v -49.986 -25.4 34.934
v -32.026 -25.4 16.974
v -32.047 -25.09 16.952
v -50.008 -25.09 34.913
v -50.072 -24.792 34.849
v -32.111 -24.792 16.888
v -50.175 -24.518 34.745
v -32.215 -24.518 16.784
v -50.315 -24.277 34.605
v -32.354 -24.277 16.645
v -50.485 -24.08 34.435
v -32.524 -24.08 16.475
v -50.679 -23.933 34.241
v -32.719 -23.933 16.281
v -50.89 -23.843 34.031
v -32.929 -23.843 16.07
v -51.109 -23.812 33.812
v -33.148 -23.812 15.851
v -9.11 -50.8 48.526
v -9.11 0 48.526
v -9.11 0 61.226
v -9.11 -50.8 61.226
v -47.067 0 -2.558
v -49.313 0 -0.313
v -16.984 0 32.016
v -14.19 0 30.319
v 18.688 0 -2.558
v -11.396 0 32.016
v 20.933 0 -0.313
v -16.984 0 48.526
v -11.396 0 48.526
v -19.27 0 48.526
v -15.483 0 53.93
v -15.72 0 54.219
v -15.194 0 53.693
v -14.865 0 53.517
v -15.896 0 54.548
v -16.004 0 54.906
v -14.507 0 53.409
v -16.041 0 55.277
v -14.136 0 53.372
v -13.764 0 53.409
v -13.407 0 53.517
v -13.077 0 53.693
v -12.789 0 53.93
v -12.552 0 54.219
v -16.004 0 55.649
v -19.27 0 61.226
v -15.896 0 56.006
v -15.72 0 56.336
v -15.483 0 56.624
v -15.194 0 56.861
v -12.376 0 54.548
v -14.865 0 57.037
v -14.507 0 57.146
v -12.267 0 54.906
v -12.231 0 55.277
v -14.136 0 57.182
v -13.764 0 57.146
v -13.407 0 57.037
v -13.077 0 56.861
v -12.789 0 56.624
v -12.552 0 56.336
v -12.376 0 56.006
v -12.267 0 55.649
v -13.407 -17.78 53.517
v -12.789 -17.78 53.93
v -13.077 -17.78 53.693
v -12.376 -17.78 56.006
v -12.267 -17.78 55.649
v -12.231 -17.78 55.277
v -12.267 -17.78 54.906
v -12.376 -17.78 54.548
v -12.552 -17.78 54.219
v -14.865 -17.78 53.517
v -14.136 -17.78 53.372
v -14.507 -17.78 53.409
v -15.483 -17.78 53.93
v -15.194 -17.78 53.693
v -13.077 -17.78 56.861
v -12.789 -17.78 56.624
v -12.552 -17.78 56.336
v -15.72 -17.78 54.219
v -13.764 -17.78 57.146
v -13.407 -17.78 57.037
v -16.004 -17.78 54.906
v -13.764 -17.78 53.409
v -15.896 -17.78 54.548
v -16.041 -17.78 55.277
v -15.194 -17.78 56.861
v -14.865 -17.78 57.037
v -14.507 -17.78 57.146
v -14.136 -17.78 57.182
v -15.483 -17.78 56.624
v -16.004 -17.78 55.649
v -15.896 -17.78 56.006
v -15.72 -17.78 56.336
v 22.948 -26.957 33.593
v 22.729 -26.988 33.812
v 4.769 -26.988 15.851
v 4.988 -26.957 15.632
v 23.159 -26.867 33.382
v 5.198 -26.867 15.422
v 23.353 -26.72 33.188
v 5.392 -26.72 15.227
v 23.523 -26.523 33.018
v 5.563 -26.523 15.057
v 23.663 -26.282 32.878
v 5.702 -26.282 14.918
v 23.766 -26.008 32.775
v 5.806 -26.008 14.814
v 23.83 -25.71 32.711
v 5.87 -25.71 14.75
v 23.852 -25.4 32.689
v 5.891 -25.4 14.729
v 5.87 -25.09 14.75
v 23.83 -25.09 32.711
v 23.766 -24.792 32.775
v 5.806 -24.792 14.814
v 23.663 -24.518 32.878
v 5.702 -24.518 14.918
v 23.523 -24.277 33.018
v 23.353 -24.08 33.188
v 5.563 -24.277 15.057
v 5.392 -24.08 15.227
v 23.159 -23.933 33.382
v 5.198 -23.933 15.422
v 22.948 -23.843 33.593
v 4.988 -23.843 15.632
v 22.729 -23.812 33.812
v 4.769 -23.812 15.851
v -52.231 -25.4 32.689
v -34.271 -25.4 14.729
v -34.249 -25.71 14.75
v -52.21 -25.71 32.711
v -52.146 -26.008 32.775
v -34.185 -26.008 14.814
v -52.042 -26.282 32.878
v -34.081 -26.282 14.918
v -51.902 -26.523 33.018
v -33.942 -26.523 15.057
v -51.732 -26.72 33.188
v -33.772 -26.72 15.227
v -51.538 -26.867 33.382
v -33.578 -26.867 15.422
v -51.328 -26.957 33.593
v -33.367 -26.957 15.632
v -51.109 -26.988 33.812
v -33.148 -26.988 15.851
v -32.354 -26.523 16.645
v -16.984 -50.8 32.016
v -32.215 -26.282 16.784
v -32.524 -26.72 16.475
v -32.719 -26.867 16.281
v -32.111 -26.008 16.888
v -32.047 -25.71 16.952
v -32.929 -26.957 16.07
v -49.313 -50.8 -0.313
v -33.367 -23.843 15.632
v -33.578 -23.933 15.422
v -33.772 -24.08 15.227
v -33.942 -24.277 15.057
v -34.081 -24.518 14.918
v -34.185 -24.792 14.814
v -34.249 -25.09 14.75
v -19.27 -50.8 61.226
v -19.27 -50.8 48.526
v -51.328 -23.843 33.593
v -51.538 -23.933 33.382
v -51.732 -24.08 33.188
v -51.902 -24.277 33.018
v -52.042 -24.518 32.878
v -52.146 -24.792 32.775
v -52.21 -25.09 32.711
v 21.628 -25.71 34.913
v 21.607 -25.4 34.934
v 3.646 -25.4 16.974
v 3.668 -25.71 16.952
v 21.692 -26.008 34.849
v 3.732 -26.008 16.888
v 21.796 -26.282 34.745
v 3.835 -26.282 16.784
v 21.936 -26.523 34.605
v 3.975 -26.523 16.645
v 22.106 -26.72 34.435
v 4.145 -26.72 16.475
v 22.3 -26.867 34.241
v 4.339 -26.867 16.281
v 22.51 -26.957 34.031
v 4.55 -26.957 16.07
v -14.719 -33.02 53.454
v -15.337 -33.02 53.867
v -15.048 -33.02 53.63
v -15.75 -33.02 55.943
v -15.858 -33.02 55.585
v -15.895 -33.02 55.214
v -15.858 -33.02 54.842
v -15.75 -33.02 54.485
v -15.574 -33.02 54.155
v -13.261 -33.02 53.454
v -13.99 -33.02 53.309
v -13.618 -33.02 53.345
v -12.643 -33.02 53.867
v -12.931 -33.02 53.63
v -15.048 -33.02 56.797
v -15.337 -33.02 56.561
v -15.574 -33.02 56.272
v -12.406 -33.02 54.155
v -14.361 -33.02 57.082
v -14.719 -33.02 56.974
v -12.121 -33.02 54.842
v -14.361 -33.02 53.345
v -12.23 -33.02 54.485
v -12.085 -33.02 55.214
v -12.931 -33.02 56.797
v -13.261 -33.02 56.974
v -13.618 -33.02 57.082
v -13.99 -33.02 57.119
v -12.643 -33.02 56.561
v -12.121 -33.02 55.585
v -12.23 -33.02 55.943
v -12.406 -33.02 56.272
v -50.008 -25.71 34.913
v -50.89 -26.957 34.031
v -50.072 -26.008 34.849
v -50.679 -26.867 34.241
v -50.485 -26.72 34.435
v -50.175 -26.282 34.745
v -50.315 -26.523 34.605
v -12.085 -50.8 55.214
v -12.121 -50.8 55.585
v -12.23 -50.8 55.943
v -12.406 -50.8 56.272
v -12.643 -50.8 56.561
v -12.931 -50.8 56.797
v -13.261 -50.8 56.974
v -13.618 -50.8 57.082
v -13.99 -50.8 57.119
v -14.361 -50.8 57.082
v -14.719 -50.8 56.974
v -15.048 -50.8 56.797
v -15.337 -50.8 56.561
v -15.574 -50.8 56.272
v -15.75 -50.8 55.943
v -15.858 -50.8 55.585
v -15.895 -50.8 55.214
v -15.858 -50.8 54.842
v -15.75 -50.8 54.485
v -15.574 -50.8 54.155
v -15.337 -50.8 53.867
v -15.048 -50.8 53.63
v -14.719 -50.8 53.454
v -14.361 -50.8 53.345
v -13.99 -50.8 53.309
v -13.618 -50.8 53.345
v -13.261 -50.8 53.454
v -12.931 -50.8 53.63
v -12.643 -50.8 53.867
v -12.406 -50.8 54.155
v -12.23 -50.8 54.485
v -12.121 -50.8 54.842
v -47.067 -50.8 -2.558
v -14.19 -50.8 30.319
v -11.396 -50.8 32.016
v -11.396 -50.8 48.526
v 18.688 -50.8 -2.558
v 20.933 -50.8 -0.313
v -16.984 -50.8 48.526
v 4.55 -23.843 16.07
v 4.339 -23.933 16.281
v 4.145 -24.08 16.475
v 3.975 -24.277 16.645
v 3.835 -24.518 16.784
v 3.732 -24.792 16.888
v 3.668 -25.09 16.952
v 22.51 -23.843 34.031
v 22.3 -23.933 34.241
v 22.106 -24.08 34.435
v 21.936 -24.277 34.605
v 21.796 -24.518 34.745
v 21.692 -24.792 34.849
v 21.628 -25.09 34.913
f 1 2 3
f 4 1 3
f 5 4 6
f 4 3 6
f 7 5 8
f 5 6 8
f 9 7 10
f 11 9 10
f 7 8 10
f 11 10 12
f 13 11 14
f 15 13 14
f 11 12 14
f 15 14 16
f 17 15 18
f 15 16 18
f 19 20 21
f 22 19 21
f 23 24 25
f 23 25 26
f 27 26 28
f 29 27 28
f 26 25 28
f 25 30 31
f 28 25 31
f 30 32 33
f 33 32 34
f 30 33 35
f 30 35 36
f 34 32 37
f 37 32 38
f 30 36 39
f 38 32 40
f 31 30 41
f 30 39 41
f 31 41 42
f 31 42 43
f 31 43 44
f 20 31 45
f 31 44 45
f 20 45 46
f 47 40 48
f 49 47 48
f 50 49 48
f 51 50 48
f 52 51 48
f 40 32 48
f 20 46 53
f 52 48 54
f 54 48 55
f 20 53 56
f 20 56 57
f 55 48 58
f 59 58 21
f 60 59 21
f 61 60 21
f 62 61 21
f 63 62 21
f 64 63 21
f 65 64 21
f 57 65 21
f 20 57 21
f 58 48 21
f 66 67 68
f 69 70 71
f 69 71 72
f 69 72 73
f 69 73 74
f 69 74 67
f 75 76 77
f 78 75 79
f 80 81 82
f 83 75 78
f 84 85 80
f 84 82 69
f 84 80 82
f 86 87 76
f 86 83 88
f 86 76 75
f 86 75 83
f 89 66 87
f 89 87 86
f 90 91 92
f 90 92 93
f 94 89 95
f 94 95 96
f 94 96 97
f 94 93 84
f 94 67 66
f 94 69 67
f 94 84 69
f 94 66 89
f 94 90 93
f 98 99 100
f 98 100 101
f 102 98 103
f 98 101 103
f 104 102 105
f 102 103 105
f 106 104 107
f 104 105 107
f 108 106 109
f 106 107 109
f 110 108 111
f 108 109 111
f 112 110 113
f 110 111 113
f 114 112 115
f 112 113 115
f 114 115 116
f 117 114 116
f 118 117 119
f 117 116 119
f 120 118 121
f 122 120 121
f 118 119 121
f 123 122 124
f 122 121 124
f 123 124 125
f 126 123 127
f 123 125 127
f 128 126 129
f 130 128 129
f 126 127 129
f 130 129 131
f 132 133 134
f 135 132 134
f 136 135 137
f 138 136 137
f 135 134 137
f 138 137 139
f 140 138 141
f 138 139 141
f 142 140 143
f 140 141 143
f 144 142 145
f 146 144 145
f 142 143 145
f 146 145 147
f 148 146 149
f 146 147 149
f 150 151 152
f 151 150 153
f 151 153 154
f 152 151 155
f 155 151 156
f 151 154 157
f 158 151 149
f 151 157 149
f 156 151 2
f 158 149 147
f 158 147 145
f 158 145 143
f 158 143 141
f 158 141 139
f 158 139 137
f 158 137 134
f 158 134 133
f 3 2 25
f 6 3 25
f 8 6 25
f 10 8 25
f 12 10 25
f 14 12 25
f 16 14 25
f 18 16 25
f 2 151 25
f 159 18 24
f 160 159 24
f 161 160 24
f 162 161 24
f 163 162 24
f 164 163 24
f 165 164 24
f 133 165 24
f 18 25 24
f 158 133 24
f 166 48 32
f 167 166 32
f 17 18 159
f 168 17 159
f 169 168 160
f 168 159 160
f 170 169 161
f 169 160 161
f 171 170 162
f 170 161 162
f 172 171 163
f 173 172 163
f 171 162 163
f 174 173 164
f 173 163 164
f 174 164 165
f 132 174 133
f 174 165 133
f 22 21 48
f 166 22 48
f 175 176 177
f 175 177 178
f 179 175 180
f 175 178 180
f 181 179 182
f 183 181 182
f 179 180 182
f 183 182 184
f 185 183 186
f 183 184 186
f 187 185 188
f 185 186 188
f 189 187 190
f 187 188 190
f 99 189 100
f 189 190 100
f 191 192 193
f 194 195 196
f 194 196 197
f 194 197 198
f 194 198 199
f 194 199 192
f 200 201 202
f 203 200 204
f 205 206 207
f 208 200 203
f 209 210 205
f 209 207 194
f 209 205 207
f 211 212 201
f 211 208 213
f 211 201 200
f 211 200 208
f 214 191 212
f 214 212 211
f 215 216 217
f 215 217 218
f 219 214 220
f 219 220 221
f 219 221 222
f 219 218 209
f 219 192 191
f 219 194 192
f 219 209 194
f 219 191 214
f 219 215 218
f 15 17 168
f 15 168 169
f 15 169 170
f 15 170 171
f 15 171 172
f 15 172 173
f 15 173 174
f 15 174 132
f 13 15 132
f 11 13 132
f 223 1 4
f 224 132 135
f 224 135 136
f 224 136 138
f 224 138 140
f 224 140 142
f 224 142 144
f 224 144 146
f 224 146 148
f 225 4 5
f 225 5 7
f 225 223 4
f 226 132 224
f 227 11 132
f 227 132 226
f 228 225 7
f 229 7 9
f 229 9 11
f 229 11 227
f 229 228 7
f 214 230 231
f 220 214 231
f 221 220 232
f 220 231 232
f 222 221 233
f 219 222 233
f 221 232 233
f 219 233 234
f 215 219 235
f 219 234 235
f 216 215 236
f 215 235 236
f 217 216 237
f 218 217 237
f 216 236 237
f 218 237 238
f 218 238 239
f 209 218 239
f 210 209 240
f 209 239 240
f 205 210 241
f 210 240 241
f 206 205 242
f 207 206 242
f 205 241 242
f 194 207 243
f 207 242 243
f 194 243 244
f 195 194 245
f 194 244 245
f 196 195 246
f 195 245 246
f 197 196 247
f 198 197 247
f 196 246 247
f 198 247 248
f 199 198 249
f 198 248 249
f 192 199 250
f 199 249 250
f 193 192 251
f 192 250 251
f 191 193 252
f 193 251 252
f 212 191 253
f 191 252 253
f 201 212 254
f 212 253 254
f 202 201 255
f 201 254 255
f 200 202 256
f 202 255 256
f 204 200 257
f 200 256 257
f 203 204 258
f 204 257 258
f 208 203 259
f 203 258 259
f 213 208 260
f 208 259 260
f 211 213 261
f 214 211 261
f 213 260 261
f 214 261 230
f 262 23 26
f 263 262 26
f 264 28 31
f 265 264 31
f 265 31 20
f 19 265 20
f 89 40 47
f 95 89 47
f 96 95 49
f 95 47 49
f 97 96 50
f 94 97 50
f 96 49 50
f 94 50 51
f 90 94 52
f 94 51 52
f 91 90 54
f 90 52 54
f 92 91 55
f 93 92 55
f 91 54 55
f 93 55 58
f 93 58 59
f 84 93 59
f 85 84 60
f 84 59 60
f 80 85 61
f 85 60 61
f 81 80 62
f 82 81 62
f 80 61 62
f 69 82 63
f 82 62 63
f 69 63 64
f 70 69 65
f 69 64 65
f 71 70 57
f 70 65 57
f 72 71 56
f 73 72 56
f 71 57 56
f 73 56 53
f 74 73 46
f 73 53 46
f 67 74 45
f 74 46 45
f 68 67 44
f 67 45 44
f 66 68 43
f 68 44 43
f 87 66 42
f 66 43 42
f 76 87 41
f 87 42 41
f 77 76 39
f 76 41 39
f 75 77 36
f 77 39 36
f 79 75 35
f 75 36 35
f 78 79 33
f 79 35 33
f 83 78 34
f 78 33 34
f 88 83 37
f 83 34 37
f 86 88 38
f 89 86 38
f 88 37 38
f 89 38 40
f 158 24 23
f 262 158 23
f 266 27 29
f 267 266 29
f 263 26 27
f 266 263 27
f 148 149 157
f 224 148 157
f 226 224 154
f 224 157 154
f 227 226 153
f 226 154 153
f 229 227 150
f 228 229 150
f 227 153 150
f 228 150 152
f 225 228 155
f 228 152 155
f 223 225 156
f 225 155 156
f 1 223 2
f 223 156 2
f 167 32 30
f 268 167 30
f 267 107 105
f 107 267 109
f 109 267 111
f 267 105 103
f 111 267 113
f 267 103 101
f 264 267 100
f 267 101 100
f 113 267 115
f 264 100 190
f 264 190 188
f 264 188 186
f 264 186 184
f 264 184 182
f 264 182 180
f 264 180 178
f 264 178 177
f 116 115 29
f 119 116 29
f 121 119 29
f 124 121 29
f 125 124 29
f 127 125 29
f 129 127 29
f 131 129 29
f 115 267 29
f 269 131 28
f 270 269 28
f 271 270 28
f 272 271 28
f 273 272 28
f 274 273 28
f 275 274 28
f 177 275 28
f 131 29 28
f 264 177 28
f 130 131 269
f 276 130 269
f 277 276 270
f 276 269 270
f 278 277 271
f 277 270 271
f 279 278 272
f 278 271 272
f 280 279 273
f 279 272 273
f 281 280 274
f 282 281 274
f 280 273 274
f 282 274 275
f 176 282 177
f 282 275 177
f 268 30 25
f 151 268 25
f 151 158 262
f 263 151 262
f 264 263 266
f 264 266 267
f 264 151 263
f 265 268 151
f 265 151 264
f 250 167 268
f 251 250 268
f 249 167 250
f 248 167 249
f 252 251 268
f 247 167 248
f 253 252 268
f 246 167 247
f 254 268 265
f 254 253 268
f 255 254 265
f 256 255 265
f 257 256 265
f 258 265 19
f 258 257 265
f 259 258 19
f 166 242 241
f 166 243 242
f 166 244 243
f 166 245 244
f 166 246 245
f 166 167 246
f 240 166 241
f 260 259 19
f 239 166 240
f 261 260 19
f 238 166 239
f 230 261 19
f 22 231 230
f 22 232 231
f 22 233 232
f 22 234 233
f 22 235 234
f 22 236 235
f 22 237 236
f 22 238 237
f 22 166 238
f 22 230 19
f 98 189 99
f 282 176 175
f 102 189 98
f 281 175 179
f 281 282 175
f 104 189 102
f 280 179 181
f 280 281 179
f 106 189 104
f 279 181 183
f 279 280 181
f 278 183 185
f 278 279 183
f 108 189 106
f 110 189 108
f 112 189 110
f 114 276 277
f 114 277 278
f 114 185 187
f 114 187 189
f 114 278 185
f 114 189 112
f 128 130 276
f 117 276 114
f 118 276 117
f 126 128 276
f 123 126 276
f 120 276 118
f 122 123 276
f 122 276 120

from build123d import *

# Parameters (mm, degrees)
F1_DEPTH = 50.8
F2_R     = 1.905
F3_DEPTH = 17.78
F6_DEPTH = 25.4
F8_DEPTH = 25.4
F4_R     = 1.905
F9_DEPTH = 17.78


with BuildPart() as f1:
    # F0 (on Front) → F1 (new body)
    with BuildSketch(Plane.XZ):
        Polygon((-9.1096315365, 61.225563957), (-19.2696315365, 61.225563957), (-19.2696315365, 48.525563957), (-16.9836315365, 48.525563957), (-16.9836315365, 32.015563957), (-14.1896315365, 32.015563957), (-11.3956315365, 32.015563957), (-11.3956315365, 48.525563957), (-9.1096315365, 48.525563957), align=None)
        Polygon((-14.1896315365, 32.015563957), (-16.9836315365, 32.015563957), (-49.3125535723, -0.3133580789), (-47.0674895421, -2.5584221091), (-14.1896315365, 30.3194358965), align=None)
        Polygon((-11.3956315365, 32.015563957), (-14.1896315365, 32.015563957), (-14.1896315365, 30.3194358965), (18.6882264691, -2.5584221091), (20.9332904994, -0.3133580789), align=None)
    extrude(amount=F1_DEPTH)

    # F2 (on face) → F3 (cut)
    with BuildSketch(Plane(origin=(0, 0, 0), x_dir=(-1, 0, 0), z_dir=(0, 1, 0))):
        with Locations((14.1358394176, 55.2771948278)):
            Circle(F2_R)
    extrude(amount=-F3_DEPTH, mode=Mode.SUBTRACT)

    # F5 (on face) → F6 (join)
    with BuildSketch(Plane(origin=(10.3099662102, 0, 10.3099662102), x_dir=(0.7071067812, 0, -0.7071067812), z_dir=(0.7071067812, 0, 0.7071067812))):
        with BuildLine():
            Line((-7.8363507129, -25.4), (-7.8363507129, -23.8125))
            ThreePointArc((-7.8363507129, -23.8125), (-8.958882728, -24.2774679849), (-9.4238507129, -25.4))
            Line((-9.4238507129, -25.4), (-7.8363507129, -25.4))
        make_face()
        with BuildLine():
            Line((-7.8363507129, -25.4), (-6.2488507129, -25.4))
            ThreePointArc((-6.2488507129, -25.4), (-6.7138186977, -24.2774679849), (-7.8363507129, -23.8125))
            Line((-7.8363507129, -23.8125), (-7.8363507129, -25.4))
        make_face()
        with BuildLine():
            ThreePointArc((-9.4238507129, -25.4), (-8.958882728, -26.5225320151), (-7.8363507129, -26.9875))
            Line((-7.8363507129, -26.9875), (-7.8363507129, -25.4))
            Line((-7.8363507129, -25.4), (-9.4238507129, -25.4))
        make_face()
        with BuildLine():
            ThreePointArc((-7.8363507129, -26.9875), (-6.7138186977, -26.5225320151), (-6.2488507129, -25.4))
            Line((-6.2488507129, -25.4), (-7.8363507129, -25.4))
            Line((-7.8363507129, -25.4), (-7.8363507129, -26.9875))
        make_face()
    extrude(amount=F6_DEPTH)

    # F7 (on face) → F8 (join)
    with BuildSketch(Plane(origin=(-24.4995977467, 0, 24.4995977467), x_dir=(0, -1, 0), z_dir=(-0.7071067812, 0, 0.7071067812))):
        with BuildLine():
            ThreePointArc((26.9875, -12.2308186511), (26.5225320151, -11.108286636), (25.4, -10.6433186511))
            Line((25.4, -10.6433186511), (25.4, -12.2308186511))
            Line((25.4, -12.2308186511), (26.9875, -12.2308186511))
        make_face()
        with BuildLine():
            Line((26.9875, -12.2308186511), (25.4, -12.2308186511))
            Line((25.4, -12.2308186511), (25.4, -13.8183186511))
            ThreePointArc((25.4, -13.8183186511), (26.5225320151, -13.3533506663), (26.9875, -12.2308186511))
        make_face()
        with BuildLine():
            Line((25.4, -12.2308186511), (23.8125, -12.2308186511))
            ThreePointArc((23.8125, -12.2308186511), (24.2774679849, -13.3533506663), (25.4, -13.8183186511))
            Line((25.4, -13.8183186511), (25.4, -12.2308186511))
        make_face()
        with BuildLine():
            Line((25.4, -12.2308186511), (25.4, -10.6433186511))
            ThreePointArc((25.4, -10.6433186511), (24.2774679849, -11.108286636), (23.8125, -12.2308186511))
            Line((23.8125, -12.2308186511), (25.4, -12.2308186511))
        make_face()
    extrude(amount=F8_DEPTH)

    # F4 (on face) → F9 (cut)
    with BuildSketch(Plane.XZ.offset(50.8)):
        with Locations((-13.9896953478, 55.213548243)):
            Circle(F4_R)
    extrude(amount=-F9_DEPTH, mode=Mode.SUBTRACT)


solid = f1.part
